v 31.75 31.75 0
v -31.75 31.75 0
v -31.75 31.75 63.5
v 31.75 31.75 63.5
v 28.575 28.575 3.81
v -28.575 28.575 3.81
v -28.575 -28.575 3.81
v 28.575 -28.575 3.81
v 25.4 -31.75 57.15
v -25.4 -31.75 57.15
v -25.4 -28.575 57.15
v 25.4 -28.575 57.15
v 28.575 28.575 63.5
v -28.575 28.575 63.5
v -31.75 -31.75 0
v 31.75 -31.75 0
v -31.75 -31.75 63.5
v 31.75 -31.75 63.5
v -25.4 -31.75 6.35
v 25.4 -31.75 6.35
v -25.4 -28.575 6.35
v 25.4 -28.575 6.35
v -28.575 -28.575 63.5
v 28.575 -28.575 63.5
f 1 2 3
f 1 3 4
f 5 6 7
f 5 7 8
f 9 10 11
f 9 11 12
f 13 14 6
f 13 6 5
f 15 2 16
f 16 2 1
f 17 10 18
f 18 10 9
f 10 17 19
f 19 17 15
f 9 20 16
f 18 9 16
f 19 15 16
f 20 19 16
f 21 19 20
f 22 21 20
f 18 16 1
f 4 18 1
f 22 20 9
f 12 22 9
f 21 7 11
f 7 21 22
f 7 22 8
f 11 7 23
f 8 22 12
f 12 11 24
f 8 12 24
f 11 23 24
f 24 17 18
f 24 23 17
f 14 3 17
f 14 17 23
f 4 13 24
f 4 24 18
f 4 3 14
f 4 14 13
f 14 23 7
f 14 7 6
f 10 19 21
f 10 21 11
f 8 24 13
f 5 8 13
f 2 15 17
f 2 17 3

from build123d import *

# Parameters (mm, degrees)
F0_W     = 63.5
F0_H     = 63.5
F1_DEPTH = 63.5
F2_W     = 50.8
F2_H     = 50.8
F3_DEPTH = 57.15
F4_W     = 57.15
F4_H     = 57.15
F5_DEPTH = 59.69


with BuildPart() as f1:
    # F0 (on Top) → F1 (new body)
    with BuildSketch(Plane.XY):
        Rectangle(F0_W, F0_H)
    extrude(amount=F1_DEPTH)

    # F2 (on face) → F3 (cut)
    with BuildSketch(Plane.XZ.offset(31.75)):
        with Locations((0, 31.75)):
            Rectangle(F2_W, F2_H)
    extrude(amount=-F3_DEPTH, mode=Mode.SUBTRACT)

    # F4 (on face) → F5 (cut)
    with BuildSketch(Plane.XY.offset(63.5)):
        Rectangle(F4_W, F4_H)
    extrude(amount=-F5_DEPTH, mode=Mode.SUBTRACT)


solid = f1.part
